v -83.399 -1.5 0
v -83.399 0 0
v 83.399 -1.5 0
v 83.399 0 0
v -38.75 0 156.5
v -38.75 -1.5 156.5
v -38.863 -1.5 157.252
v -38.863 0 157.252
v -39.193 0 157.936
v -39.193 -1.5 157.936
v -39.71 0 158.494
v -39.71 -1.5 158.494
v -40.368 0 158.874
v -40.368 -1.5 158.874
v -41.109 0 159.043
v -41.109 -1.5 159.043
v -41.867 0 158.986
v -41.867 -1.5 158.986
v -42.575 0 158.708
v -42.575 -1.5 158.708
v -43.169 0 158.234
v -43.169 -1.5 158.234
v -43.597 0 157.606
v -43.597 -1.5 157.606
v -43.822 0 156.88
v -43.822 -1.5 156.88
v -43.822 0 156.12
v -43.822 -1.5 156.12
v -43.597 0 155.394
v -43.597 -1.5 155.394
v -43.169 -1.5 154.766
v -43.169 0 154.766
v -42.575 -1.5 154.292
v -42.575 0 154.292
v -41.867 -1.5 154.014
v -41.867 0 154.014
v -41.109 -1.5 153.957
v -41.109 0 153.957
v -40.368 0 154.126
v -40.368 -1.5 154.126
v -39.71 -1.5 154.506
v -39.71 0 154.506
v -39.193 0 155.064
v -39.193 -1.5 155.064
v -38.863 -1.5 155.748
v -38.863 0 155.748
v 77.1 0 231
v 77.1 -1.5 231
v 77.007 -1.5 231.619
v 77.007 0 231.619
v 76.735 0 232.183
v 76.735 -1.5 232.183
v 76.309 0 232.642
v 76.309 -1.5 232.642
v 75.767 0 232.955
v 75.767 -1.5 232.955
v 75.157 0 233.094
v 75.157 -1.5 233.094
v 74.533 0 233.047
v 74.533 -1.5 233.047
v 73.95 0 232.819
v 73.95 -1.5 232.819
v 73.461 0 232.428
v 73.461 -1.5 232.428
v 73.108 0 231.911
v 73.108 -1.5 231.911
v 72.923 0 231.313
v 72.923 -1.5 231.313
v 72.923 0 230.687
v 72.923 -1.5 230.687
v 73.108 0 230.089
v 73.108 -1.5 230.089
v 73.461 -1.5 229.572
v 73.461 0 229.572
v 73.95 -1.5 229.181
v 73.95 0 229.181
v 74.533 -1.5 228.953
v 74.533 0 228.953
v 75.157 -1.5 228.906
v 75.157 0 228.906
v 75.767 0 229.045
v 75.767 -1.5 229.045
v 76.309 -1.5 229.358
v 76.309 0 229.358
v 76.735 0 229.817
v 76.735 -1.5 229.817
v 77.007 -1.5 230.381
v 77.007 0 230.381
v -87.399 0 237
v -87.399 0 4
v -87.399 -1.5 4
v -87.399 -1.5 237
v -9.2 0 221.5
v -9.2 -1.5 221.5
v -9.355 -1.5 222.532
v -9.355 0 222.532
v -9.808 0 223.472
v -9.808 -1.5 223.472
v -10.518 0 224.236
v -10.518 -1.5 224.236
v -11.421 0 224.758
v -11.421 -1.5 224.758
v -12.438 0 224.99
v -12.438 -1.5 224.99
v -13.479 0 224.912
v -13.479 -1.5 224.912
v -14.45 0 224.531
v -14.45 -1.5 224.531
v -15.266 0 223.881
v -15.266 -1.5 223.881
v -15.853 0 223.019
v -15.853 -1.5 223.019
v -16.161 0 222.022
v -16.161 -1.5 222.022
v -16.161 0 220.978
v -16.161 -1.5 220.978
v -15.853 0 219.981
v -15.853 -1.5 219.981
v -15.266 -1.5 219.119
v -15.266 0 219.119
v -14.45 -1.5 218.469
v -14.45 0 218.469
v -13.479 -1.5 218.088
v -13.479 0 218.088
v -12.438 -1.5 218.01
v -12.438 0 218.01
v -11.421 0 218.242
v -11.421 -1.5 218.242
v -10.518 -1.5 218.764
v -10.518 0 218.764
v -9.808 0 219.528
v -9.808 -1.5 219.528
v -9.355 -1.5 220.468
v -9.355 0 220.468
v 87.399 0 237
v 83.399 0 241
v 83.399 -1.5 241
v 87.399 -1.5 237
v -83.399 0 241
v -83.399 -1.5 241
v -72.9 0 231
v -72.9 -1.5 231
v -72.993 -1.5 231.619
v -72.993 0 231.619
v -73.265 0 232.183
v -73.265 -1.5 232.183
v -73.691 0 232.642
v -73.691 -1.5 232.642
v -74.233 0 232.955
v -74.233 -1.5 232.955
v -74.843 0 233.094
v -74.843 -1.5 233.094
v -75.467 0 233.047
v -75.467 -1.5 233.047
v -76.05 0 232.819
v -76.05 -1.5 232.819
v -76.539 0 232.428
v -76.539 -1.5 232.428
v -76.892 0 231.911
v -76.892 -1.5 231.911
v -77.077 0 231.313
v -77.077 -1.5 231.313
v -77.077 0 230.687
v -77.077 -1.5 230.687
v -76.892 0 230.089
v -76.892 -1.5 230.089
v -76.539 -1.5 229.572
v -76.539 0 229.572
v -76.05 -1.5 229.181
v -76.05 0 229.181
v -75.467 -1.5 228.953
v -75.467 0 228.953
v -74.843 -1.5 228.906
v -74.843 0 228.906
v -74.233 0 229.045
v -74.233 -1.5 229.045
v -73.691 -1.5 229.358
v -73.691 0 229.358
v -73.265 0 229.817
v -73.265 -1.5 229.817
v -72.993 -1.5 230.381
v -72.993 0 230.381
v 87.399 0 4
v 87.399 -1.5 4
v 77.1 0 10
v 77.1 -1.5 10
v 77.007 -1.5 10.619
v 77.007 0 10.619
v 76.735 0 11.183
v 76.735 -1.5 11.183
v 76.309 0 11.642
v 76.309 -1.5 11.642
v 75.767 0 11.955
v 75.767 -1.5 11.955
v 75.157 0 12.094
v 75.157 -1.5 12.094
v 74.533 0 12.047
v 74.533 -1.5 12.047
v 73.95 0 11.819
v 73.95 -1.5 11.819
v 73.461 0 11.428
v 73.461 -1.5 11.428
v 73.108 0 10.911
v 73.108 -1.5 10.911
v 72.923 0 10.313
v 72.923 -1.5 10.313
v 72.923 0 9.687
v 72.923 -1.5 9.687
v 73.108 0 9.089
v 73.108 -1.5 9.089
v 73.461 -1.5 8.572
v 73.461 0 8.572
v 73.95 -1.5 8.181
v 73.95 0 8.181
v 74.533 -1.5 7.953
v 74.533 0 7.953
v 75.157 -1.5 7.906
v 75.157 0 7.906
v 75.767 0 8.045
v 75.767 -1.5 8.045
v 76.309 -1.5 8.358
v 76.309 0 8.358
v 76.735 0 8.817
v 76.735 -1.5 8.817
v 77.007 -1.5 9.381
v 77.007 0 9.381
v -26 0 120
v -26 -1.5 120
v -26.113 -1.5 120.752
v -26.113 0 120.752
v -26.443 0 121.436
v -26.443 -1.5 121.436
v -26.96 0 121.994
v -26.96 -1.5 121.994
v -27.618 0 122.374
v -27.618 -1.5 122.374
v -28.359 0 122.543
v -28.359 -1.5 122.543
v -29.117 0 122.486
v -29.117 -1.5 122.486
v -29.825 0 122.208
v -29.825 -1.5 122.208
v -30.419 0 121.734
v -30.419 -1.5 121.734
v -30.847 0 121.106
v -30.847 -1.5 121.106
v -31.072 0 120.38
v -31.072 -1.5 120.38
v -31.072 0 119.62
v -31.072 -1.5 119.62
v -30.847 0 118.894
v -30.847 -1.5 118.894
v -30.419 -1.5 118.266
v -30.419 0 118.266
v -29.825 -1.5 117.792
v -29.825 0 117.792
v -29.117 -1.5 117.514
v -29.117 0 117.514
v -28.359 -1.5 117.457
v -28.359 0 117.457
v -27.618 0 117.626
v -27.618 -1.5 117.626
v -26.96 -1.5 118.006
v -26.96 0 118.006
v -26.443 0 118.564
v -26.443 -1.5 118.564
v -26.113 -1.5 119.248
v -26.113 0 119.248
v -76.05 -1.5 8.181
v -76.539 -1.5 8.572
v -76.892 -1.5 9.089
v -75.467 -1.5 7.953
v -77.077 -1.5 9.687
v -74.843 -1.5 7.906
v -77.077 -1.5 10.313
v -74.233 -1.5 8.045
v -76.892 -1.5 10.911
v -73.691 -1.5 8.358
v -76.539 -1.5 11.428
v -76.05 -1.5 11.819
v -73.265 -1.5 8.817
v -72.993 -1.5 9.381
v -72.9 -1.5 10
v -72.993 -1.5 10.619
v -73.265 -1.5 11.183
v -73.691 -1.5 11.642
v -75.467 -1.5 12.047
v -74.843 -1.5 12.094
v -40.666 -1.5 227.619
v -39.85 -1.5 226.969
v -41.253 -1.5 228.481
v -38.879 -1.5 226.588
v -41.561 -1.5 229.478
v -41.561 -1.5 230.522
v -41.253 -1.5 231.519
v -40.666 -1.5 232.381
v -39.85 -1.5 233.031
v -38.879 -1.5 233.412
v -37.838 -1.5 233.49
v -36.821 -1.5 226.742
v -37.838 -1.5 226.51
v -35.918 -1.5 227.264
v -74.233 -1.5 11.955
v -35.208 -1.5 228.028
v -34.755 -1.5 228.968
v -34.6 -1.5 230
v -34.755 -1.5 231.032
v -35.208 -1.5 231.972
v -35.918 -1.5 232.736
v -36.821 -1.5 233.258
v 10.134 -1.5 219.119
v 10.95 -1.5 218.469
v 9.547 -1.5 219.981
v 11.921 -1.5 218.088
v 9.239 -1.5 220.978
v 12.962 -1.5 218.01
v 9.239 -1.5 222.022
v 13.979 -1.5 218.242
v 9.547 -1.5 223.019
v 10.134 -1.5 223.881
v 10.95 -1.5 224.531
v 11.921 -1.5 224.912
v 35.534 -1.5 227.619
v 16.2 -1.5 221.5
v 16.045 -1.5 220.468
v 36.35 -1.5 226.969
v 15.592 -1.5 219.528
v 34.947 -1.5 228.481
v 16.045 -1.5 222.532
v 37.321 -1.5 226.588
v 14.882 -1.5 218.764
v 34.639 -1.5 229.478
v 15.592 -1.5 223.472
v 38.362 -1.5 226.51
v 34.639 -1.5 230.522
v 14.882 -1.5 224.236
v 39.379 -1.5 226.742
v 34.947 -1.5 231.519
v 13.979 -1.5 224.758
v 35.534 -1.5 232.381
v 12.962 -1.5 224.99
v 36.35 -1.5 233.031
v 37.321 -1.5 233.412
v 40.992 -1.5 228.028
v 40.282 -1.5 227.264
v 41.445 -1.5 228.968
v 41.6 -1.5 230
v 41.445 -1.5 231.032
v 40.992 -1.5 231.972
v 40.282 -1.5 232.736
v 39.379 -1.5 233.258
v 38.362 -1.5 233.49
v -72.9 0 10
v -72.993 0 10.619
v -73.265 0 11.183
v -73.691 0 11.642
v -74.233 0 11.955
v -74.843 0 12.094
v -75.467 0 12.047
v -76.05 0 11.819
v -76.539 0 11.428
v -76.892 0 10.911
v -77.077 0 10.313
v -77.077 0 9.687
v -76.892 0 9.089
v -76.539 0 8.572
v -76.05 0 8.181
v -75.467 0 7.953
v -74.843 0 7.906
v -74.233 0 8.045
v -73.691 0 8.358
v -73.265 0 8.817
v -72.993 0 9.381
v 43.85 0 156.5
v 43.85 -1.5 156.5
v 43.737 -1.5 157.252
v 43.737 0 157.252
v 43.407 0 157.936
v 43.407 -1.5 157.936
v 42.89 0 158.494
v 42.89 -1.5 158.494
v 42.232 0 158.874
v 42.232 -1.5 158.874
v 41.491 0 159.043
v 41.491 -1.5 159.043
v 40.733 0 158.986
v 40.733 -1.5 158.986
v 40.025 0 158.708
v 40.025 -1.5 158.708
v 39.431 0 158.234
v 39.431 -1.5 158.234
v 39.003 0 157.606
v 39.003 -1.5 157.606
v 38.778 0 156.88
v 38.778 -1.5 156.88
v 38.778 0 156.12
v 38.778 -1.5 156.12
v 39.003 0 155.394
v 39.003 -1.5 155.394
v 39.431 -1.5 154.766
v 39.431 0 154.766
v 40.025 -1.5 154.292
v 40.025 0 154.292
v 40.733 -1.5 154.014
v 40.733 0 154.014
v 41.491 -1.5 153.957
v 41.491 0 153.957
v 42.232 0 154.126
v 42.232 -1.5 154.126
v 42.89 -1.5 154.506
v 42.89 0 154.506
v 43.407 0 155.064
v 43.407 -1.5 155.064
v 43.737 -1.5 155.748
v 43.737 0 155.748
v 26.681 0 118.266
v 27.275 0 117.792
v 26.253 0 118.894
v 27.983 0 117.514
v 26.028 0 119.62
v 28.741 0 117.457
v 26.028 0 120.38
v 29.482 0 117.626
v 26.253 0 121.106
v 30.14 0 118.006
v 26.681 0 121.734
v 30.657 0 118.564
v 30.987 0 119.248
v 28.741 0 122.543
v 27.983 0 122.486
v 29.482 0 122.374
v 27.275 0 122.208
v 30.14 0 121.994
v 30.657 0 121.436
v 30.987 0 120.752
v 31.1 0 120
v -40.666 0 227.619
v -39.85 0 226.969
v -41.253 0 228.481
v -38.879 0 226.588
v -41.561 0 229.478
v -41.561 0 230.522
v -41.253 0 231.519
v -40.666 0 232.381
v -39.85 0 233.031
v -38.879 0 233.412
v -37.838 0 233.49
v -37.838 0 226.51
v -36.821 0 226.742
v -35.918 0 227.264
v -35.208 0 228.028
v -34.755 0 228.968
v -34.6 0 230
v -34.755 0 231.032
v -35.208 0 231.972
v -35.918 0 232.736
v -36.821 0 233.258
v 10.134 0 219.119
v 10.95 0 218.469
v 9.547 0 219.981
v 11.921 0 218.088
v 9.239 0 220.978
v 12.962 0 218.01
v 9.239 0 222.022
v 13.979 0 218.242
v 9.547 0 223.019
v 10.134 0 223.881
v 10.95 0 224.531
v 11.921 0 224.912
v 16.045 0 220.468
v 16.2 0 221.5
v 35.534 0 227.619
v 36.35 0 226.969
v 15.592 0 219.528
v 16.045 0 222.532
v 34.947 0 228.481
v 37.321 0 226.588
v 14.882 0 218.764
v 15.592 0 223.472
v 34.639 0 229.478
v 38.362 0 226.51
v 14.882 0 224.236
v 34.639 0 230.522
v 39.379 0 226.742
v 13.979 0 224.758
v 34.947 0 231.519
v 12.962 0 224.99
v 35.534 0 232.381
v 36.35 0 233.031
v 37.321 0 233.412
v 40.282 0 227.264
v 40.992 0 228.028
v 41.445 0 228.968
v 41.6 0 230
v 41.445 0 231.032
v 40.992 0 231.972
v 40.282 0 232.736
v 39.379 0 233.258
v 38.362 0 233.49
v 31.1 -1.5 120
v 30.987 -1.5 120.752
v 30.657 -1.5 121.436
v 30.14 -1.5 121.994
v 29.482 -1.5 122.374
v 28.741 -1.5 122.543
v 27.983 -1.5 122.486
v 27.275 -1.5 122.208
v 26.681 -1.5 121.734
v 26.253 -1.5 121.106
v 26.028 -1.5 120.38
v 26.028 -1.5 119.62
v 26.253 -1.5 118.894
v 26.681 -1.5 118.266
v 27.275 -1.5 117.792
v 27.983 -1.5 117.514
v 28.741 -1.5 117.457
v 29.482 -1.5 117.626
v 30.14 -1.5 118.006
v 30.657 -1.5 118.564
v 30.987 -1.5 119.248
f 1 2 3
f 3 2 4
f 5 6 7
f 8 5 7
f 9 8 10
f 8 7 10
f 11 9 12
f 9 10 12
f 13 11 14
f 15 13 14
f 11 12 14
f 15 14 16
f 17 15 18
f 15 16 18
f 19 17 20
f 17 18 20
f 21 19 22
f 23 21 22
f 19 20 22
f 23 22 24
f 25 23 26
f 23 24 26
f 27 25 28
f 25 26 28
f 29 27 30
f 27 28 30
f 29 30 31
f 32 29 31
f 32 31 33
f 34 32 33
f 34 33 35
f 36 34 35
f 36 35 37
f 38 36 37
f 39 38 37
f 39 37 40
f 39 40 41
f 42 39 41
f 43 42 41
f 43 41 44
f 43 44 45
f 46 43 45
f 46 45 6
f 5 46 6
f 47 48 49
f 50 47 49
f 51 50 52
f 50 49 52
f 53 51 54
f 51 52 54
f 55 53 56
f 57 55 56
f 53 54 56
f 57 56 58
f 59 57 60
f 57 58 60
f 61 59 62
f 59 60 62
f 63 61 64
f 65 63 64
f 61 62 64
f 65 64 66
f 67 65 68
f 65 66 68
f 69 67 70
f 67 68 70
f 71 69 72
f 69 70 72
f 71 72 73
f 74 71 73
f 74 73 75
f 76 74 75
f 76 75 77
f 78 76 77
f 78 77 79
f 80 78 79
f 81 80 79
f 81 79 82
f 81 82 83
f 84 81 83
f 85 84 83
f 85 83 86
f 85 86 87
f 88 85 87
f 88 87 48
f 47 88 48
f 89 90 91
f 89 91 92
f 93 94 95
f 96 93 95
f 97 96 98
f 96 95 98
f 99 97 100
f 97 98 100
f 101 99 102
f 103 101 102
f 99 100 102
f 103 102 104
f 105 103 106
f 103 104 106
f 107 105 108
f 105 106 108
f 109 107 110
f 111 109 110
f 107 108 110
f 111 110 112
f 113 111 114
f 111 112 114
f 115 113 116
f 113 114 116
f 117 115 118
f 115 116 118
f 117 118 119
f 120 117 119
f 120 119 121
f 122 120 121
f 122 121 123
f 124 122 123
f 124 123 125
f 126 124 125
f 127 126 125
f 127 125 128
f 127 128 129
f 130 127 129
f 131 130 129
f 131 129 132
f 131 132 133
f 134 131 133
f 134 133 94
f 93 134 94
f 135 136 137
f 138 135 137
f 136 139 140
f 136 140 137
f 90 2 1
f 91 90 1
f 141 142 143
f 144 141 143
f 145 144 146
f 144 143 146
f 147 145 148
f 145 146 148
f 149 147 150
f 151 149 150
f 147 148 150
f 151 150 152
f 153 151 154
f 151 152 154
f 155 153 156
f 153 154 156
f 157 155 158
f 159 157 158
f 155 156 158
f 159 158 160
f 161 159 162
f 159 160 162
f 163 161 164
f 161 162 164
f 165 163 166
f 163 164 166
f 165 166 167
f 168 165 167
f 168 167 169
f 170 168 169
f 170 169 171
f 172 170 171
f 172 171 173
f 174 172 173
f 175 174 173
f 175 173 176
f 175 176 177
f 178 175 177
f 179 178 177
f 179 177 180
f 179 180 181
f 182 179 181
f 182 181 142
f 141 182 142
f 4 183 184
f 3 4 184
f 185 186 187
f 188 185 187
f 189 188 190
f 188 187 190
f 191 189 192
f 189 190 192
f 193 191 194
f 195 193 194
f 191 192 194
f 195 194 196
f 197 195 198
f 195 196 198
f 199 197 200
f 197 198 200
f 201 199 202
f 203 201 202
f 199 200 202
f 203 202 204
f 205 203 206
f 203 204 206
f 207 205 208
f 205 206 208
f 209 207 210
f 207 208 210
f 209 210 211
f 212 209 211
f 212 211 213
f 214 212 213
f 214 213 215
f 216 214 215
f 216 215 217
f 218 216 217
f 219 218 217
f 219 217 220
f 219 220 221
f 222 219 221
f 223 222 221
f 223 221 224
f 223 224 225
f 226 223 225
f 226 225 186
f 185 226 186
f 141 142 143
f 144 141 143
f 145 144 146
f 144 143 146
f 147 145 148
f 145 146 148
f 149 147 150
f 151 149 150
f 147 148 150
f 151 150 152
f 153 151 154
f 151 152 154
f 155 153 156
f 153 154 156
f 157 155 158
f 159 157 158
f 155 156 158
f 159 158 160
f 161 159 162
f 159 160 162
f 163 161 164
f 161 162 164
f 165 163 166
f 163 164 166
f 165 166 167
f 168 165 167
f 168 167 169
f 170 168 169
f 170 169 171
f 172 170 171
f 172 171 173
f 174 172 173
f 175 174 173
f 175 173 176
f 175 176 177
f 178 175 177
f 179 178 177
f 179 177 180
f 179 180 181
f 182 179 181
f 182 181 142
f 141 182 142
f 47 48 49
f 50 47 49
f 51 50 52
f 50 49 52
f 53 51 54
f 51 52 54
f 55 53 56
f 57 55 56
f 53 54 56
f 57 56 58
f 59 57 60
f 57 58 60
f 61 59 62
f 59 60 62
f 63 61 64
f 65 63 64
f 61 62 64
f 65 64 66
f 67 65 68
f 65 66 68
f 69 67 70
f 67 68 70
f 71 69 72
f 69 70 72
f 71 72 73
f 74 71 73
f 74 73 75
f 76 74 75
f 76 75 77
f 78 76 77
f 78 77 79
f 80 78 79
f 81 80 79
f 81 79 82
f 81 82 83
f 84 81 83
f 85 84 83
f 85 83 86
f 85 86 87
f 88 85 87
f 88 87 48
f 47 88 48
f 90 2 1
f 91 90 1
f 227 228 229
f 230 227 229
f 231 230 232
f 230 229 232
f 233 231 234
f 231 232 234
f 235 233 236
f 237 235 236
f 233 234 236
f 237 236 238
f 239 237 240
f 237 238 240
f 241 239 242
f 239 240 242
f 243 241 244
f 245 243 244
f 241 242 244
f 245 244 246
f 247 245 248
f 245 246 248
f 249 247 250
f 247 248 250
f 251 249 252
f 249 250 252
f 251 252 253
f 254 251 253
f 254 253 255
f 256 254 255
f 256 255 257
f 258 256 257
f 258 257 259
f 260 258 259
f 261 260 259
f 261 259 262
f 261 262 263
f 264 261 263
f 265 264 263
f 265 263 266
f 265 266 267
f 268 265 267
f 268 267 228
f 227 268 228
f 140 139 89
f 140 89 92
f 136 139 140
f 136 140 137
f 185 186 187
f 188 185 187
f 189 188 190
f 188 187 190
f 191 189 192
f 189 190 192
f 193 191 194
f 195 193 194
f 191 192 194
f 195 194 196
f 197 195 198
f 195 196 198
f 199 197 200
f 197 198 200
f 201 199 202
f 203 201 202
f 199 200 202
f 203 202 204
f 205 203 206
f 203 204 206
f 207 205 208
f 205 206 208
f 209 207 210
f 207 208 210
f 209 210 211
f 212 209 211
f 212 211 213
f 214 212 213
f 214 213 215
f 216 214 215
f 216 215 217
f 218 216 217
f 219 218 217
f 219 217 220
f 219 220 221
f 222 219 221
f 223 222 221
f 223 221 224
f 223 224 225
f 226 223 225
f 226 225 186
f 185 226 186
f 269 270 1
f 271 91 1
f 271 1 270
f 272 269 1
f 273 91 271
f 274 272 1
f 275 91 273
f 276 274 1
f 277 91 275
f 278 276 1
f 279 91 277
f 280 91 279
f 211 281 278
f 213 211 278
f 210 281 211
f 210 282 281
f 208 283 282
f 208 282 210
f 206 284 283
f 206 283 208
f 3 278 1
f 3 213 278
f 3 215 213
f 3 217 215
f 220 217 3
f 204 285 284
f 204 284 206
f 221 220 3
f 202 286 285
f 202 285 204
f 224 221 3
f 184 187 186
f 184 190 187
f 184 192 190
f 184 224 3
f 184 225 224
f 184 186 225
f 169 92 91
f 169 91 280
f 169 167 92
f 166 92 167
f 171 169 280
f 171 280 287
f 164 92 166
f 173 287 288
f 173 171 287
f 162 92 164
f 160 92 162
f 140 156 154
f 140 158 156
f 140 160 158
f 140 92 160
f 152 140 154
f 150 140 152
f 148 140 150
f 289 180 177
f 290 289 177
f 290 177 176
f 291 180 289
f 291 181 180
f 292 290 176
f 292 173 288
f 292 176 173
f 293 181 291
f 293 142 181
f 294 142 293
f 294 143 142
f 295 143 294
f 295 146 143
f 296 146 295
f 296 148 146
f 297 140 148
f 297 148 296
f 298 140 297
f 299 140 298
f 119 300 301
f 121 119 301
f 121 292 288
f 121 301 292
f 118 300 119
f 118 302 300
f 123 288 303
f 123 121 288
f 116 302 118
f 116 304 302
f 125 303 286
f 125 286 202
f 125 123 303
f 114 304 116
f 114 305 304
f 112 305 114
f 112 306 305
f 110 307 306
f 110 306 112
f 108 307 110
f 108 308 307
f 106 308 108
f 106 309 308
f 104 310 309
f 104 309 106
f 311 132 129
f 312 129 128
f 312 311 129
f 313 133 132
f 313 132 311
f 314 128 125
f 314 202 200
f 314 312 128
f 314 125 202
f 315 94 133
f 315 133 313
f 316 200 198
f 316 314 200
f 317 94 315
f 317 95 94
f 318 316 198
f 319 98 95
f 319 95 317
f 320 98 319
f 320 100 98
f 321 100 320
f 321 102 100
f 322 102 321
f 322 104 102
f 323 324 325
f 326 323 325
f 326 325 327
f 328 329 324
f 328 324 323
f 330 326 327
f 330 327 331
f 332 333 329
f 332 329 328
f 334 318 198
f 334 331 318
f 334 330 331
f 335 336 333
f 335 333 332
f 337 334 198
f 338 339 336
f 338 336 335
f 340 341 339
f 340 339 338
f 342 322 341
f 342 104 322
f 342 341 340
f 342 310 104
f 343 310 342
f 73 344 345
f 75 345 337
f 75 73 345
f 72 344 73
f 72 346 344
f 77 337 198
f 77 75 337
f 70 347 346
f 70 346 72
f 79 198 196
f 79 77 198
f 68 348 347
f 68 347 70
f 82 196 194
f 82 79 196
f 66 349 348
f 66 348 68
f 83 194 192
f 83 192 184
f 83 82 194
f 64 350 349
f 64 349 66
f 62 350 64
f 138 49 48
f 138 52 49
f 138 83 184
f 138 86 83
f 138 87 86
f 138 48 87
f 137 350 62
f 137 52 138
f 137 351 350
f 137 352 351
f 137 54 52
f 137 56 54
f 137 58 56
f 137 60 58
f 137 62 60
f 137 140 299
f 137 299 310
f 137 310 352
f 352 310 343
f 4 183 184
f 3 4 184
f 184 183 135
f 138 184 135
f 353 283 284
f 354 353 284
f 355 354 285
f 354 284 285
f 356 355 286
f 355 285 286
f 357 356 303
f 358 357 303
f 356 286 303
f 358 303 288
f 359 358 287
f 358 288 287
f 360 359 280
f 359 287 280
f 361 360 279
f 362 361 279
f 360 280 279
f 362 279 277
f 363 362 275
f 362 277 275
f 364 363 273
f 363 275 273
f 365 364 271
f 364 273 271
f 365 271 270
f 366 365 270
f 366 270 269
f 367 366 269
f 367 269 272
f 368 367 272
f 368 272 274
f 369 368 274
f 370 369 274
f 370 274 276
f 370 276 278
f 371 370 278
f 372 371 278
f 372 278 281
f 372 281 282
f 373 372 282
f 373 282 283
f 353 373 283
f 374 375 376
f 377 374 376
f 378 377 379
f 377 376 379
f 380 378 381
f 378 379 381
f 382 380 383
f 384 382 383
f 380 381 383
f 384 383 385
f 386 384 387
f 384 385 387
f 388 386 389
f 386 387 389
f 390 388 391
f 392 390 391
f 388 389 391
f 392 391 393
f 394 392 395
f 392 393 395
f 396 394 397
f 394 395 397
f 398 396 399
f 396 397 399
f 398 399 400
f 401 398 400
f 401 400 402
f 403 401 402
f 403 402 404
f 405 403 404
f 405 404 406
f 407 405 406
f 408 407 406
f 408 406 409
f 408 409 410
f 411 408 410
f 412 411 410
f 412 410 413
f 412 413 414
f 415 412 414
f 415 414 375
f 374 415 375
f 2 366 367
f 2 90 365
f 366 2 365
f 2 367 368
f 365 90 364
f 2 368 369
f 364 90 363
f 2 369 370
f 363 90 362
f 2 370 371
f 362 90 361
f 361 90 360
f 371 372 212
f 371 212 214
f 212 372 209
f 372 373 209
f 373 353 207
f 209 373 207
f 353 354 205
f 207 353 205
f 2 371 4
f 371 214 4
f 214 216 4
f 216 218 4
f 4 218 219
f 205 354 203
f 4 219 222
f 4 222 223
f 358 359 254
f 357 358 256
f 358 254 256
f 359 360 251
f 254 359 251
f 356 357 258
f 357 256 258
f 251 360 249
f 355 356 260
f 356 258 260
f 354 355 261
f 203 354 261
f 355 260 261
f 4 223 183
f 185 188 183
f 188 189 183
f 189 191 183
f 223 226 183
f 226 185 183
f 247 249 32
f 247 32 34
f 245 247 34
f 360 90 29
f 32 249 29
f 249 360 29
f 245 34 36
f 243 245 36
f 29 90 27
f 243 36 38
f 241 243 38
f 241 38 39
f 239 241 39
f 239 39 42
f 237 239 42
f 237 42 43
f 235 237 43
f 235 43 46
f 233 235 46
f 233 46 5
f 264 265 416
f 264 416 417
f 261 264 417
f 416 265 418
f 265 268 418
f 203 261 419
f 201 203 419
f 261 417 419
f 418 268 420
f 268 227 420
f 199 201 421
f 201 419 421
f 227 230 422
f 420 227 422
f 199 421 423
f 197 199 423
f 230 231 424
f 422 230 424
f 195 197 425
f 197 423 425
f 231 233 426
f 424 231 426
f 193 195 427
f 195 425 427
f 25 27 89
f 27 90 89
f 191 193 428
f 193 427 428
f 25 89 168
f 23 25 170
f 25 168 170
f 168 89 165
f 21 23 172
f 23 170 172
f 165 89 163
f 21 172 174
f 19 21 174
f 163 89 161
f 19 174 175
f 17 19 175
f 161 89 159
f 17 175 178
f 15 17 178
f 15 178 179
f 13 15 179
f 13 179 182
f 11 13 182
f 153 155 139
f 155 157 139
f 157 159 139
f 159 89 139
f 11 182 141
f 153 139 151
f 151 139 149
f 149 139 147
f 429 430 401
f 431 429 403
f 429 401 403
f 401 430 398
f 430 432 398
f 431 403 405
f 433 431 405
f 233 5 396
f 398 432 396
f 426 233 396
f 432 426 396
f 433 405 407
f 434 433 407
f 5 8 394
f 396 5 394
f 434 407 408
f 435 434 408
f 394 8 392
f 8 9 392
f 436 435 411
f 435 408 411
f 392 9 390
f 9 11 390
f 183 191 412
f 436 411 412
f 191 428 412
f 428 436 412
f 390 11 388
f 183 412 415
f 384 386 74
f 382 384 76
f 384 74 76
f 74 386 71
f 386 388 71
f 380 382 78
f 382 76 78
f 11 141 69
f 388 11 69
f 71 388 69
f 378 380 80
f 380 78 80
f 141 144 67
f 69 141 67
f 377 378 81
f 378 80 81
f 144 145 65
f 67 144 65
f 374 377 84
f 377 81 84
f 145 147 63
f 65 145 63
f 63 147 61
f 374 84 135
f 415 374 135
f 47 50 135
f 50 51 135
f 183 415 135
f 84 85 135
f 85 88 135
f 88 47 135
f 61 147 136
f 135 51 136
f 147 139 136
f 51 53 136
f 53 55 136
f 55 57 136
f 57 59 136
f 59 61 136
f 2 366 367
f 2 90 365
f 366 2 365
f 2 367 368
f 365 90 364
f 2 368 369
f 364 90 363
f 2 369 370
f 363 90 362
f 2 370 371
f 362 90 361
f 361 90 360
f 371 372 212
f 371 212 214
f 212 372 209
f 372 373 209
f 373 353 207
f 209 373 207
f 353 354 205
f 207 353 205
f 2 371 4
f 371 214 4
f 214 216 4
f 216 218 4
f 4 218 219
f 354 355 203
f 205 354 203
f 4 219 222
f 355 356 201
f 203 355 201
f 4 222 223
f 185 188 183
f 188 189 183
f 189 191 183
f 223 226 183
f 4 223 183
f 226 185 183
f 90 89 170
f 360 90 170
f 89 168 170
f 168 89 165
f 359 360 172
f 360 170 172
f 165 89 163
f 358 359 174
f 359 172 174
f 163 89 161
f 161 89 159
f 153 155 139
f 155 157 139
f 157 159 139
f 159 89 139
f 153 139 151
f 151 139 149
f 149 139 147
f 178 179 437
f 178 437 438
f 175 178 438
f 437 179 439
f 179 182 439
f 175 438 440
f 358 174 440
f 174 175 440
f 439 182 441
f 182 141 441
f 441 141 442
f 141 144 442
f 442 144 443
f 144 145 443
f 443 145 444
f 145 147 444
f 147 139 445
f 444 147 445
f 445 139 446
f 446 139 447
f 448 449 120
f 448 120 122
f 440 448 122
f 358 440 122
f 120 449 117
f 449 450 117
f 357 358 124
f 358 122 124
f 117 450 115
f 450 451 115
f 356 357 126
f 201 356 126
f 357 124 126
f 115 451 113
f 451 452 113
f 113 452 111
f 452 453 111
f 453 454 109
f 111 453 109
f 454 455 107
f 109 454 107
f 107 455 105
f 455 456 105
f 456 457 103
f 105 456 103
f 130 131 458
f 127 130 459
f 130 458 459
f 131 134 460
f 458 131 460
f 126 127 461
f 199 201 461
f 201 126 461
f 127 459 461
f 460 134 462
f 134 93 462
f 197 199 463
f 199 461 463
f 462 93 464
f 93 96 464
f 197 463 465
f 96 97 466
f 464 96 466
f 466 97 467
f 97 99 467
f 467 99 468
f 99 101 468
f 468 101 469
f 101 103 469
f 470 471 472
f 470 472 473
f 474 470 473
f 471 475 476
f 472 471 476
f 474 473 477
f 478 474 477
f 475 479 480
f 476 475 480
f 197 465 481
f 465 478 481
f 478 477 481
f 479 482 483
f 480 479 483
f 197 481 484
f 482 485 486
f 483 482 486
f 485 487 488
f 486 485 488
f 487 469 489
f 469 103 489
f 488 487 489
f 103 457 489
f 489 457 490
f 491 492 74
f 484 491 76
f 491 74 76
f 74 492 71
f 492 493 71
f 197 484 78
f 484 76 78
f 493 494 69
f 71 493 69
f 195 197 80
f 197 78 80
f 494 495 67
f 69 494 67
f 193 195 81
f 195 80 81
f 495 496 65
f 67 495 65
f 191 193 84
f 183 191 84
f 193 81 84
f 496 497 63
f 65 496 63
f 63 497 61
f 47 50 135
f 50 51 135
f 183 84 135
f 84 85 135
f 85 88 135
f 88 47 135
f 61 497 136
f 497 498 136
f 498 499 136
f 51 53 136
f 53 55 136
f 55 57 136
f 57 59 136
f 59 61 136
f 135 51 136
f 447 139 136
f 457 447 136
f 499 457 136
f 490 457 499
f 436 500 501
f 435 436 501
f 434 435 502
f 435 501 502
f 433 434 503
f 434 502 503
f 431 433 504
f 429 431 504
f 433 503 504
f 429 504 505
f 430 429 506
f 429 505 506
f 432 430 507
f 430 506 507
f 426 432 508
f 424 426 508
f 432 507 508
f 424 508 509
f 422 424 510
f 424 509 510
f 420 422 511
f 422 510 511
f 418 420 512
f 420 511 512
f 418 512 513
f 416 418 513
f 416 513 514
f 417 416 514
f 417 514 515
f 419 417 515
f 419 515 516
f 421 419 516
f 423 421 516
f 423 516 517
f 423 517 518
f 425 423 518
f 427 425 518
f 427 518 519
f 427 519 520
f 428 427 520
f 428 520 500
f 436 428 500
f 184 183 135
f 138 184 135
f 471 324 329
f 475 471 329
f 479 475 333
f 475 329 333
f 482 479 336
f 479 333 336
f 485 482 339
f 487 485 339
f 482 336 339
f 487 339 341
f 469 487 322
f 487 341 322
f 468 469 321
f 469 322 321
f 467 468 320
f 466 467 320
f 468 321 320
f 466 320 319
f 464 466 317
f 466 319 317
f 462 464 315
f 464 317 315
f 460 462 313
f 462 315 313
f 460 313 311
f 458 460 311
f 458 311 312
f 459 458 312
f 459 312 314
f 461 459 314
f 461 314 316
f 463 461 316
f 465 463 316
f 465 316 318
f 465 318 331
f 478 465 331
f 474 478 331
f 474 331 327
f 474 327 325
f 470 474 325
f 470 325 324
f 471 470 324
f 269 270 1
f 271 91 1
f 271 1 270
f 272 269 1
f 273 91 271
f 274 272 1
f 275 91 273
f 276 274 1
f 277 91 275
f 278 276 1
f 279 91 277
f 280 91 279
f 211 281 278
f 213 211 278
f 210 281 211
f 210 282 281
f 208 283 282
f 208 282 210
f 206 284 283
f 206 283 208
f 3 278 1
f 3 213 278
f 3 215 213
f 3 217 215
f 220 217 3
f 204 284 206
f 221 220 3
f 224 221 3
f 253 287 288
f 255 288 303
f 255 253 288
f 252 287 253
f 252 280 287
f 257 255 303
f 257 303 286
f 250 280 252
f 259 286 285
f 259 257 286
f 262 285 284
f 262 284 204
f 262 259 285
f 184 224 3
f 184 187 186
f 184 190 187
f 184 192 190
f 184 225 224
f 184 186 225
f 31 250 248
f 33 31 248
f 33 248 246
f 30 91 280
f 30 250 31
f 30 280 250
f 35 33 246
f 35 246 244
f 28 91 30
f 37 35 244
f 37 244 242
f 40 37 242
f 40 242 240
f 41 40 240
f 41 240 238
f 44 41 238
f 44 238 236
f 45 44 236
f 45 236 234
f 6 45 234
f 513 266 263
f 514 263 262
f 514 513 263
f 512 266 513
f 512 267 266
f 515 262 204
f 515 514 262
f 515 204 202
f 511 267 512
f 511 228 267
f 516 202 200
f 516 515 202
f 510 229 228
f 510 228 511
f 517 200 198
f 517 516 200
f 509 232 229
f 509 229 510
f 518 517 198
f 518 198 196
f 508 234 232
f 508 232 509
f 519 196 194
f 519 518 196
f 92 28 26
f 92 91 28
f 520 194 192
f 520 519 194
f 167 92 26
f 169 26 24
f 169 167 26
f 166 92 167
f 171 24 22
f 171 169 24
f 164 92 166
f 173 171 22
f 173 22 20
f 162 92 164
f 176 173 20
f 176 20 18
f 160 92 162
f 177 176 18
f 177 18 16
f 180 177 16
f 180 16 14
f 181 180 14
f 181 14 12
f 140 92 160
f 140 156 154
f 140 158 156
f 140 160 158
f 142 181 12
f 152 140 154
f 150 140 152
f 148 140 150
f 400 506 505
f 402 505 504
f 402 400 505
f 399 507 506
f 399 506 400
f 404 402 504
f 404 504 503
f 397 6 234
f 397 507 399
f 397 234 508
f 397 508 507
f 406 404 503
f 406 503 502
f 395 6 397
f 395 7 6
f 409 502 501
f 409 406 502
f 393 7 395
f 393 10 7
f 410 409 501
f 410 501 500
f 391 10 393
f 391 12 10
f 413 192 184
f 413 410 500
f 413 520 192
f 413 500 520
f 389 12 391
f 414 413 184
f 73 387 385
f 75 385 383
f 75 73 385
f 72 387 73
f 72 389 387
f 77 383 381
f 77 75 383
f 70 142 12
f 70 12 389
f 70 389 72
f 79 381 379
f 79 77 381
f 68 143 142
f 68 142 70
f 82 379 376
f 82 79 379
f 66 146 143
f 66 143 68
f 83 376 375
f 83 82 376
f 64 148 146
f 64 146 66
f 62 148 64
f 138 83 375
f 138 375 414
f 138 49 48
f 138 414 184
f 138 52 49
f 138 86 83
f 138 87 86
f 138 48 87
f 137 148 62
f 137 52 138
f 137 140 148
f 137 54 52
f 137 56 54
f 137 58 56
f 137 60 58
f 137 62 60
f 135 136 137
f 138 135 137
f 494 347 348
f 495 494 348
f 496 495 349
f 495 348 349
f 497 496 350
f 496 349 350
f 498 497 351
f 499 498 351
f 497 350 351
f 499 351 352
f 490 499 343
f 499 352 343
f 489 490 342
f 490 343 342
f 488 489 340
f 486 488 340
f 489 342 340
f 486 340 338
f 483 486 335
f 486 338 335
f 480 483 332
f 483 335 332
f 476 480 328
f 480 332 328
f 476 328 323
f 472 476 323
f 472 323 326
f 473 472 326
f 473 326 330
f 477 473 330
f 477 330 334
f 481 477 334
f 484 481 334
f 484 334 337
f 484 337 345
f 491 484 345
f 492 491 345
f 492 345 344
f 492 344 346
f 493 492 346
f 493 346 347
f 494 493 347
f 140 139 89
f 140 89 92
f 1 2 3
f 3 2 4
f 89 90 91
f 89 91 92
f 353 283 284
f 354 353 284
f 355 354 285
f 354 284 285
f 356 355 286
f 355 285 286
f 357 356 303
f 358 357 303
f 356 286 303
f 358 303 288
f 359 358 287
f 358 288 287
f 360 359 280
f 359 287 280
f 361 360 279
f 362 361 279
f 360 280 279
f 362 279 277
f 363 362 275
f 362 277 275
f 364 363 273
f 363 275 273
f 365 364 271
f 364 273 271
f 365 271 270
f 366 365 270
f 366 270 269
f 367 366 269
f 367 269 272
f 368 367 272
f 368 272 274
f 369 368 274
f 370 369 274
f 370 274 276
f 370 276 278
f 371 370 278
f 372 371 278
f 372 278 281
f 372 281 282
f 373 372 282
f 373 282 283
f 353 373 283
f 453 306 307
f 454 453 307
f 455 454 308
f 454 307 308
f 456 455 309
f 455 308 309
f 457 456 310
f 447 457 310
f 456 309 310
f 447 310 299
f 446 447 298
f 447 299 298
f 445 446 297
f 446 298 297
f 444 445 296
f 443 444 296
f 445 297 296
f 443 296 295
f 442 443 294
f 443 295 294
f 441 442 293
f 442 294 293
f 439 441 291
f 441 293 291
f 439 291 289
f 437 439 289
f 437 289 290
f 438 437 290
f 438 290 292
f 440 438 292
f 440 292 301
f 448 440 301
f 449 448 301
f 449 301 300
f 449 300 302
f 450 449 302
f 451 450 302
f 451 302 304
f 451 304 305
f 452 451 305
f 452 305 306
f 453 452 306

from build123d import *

# Parameters (mm, degrees)
SKETCH_W      = 174.798124
SKETCH_H      = 241
PAD_DEPTH     = 1.5
SKETCH001_R   = 2.1
HOLE_DEPTH    = 1.501
CHAMFER_SIZE  = 4
SKETCH002_R   = 3.5
HOLE001_DEPTH = 25
SKETCH003_R   = 2.55
HOLE002_DEPTH = 1.501


with BuildPart() as oct_ufpnl_ab:
    # Sketch → Pad (new body)
    with BuildSketch(Plane.XZ):
        with Locations((0, 120.5)):
            Rectangle(SKETCH_W, SKETCH_H)
    extrude(amount=PAD_DEPTH)

    # Sketch001 (on Face6 of Pad) → Hole (cut, through all)
    with BuildSketch(Plane.XZ.offset(1.5)):
        with Locations((-75, 231)):
            Circle(SKETCH001_R)
        with Locations((75, 231)):
            Circle(SKETCH001_R)
        with Locations((-75, 10)):
            Circle(SKETCH001_R)
        with Locations((75, 10)):
            Circle(SKETCH001_R)
    extrude(amount=-HOLE_DEPTH, mode=Mode.SUBTRACT)

    # Chamfer
    chamfer_edges = [oct_ufpnl_ab.edges().sort_by_distance(p)[0] for p in [
        (87.399062, -0.75, 0),
        (-87.399062, -0.75, 0),
        (-87.399062, -0.75, 241),
        (87.399062, -0.75, 241),
    ]]
    chamfer(chamfer_edges, length=CHAMFER_SIZE)


with BuildPart() as oct_ufpnl_bb:
    # Body001 base: copy of OCT-UFPNL-AB
    add(oct_ufpnl_ab.part)

    # Sketch002 (on Face5 of Clone) → Hole001 (cut)
    with BuildSketch(Plane.XZ.offset(1.5)):
        with Locations((-38.1, 230)):
            Circle(SKETCH002_R)
        with Locations((-12.7, 221.5)):
            Circle(SKETCH002_R)
        with Locations((12.7, 221.5)):
            Circle(SKETCH002_R)
        with Locations((38.1, 230)):
            Circle(SKETCH002_R)
    extrude(amount=-HOLE001_DEPTH, mode=Mode.SUBTRACT)


with BuildPart() as oct_ufpnl_cb:
    # Body002 base: copy of OCT-UFPNL-AB
    add(oct_ufpnl_ab.part)

    # Sketch003 (on Face5 of Clone001) → Hole002 (cut, through all)
    with BuildSketch(Plane.XZ.offset(1.5)):
        with Locations((-41.3, 156.5)):
            Circle(SKETCH003_R)
        with Locations((41.3, 156.5)):
            Circle(SKETCH003_R)
        with Locations((-28.55, 120)):
            Circle(SKETCH003_R)
        with Locations((28.55, 120)):
            Circle(SKETCH003_R)
    extrude(amount=-HOLE002_DEPTH, mode=Mode.SUBTRACT)


solid = Compound([oct_ufpnl_bb.part, oct_ufpnl_cb.part])
